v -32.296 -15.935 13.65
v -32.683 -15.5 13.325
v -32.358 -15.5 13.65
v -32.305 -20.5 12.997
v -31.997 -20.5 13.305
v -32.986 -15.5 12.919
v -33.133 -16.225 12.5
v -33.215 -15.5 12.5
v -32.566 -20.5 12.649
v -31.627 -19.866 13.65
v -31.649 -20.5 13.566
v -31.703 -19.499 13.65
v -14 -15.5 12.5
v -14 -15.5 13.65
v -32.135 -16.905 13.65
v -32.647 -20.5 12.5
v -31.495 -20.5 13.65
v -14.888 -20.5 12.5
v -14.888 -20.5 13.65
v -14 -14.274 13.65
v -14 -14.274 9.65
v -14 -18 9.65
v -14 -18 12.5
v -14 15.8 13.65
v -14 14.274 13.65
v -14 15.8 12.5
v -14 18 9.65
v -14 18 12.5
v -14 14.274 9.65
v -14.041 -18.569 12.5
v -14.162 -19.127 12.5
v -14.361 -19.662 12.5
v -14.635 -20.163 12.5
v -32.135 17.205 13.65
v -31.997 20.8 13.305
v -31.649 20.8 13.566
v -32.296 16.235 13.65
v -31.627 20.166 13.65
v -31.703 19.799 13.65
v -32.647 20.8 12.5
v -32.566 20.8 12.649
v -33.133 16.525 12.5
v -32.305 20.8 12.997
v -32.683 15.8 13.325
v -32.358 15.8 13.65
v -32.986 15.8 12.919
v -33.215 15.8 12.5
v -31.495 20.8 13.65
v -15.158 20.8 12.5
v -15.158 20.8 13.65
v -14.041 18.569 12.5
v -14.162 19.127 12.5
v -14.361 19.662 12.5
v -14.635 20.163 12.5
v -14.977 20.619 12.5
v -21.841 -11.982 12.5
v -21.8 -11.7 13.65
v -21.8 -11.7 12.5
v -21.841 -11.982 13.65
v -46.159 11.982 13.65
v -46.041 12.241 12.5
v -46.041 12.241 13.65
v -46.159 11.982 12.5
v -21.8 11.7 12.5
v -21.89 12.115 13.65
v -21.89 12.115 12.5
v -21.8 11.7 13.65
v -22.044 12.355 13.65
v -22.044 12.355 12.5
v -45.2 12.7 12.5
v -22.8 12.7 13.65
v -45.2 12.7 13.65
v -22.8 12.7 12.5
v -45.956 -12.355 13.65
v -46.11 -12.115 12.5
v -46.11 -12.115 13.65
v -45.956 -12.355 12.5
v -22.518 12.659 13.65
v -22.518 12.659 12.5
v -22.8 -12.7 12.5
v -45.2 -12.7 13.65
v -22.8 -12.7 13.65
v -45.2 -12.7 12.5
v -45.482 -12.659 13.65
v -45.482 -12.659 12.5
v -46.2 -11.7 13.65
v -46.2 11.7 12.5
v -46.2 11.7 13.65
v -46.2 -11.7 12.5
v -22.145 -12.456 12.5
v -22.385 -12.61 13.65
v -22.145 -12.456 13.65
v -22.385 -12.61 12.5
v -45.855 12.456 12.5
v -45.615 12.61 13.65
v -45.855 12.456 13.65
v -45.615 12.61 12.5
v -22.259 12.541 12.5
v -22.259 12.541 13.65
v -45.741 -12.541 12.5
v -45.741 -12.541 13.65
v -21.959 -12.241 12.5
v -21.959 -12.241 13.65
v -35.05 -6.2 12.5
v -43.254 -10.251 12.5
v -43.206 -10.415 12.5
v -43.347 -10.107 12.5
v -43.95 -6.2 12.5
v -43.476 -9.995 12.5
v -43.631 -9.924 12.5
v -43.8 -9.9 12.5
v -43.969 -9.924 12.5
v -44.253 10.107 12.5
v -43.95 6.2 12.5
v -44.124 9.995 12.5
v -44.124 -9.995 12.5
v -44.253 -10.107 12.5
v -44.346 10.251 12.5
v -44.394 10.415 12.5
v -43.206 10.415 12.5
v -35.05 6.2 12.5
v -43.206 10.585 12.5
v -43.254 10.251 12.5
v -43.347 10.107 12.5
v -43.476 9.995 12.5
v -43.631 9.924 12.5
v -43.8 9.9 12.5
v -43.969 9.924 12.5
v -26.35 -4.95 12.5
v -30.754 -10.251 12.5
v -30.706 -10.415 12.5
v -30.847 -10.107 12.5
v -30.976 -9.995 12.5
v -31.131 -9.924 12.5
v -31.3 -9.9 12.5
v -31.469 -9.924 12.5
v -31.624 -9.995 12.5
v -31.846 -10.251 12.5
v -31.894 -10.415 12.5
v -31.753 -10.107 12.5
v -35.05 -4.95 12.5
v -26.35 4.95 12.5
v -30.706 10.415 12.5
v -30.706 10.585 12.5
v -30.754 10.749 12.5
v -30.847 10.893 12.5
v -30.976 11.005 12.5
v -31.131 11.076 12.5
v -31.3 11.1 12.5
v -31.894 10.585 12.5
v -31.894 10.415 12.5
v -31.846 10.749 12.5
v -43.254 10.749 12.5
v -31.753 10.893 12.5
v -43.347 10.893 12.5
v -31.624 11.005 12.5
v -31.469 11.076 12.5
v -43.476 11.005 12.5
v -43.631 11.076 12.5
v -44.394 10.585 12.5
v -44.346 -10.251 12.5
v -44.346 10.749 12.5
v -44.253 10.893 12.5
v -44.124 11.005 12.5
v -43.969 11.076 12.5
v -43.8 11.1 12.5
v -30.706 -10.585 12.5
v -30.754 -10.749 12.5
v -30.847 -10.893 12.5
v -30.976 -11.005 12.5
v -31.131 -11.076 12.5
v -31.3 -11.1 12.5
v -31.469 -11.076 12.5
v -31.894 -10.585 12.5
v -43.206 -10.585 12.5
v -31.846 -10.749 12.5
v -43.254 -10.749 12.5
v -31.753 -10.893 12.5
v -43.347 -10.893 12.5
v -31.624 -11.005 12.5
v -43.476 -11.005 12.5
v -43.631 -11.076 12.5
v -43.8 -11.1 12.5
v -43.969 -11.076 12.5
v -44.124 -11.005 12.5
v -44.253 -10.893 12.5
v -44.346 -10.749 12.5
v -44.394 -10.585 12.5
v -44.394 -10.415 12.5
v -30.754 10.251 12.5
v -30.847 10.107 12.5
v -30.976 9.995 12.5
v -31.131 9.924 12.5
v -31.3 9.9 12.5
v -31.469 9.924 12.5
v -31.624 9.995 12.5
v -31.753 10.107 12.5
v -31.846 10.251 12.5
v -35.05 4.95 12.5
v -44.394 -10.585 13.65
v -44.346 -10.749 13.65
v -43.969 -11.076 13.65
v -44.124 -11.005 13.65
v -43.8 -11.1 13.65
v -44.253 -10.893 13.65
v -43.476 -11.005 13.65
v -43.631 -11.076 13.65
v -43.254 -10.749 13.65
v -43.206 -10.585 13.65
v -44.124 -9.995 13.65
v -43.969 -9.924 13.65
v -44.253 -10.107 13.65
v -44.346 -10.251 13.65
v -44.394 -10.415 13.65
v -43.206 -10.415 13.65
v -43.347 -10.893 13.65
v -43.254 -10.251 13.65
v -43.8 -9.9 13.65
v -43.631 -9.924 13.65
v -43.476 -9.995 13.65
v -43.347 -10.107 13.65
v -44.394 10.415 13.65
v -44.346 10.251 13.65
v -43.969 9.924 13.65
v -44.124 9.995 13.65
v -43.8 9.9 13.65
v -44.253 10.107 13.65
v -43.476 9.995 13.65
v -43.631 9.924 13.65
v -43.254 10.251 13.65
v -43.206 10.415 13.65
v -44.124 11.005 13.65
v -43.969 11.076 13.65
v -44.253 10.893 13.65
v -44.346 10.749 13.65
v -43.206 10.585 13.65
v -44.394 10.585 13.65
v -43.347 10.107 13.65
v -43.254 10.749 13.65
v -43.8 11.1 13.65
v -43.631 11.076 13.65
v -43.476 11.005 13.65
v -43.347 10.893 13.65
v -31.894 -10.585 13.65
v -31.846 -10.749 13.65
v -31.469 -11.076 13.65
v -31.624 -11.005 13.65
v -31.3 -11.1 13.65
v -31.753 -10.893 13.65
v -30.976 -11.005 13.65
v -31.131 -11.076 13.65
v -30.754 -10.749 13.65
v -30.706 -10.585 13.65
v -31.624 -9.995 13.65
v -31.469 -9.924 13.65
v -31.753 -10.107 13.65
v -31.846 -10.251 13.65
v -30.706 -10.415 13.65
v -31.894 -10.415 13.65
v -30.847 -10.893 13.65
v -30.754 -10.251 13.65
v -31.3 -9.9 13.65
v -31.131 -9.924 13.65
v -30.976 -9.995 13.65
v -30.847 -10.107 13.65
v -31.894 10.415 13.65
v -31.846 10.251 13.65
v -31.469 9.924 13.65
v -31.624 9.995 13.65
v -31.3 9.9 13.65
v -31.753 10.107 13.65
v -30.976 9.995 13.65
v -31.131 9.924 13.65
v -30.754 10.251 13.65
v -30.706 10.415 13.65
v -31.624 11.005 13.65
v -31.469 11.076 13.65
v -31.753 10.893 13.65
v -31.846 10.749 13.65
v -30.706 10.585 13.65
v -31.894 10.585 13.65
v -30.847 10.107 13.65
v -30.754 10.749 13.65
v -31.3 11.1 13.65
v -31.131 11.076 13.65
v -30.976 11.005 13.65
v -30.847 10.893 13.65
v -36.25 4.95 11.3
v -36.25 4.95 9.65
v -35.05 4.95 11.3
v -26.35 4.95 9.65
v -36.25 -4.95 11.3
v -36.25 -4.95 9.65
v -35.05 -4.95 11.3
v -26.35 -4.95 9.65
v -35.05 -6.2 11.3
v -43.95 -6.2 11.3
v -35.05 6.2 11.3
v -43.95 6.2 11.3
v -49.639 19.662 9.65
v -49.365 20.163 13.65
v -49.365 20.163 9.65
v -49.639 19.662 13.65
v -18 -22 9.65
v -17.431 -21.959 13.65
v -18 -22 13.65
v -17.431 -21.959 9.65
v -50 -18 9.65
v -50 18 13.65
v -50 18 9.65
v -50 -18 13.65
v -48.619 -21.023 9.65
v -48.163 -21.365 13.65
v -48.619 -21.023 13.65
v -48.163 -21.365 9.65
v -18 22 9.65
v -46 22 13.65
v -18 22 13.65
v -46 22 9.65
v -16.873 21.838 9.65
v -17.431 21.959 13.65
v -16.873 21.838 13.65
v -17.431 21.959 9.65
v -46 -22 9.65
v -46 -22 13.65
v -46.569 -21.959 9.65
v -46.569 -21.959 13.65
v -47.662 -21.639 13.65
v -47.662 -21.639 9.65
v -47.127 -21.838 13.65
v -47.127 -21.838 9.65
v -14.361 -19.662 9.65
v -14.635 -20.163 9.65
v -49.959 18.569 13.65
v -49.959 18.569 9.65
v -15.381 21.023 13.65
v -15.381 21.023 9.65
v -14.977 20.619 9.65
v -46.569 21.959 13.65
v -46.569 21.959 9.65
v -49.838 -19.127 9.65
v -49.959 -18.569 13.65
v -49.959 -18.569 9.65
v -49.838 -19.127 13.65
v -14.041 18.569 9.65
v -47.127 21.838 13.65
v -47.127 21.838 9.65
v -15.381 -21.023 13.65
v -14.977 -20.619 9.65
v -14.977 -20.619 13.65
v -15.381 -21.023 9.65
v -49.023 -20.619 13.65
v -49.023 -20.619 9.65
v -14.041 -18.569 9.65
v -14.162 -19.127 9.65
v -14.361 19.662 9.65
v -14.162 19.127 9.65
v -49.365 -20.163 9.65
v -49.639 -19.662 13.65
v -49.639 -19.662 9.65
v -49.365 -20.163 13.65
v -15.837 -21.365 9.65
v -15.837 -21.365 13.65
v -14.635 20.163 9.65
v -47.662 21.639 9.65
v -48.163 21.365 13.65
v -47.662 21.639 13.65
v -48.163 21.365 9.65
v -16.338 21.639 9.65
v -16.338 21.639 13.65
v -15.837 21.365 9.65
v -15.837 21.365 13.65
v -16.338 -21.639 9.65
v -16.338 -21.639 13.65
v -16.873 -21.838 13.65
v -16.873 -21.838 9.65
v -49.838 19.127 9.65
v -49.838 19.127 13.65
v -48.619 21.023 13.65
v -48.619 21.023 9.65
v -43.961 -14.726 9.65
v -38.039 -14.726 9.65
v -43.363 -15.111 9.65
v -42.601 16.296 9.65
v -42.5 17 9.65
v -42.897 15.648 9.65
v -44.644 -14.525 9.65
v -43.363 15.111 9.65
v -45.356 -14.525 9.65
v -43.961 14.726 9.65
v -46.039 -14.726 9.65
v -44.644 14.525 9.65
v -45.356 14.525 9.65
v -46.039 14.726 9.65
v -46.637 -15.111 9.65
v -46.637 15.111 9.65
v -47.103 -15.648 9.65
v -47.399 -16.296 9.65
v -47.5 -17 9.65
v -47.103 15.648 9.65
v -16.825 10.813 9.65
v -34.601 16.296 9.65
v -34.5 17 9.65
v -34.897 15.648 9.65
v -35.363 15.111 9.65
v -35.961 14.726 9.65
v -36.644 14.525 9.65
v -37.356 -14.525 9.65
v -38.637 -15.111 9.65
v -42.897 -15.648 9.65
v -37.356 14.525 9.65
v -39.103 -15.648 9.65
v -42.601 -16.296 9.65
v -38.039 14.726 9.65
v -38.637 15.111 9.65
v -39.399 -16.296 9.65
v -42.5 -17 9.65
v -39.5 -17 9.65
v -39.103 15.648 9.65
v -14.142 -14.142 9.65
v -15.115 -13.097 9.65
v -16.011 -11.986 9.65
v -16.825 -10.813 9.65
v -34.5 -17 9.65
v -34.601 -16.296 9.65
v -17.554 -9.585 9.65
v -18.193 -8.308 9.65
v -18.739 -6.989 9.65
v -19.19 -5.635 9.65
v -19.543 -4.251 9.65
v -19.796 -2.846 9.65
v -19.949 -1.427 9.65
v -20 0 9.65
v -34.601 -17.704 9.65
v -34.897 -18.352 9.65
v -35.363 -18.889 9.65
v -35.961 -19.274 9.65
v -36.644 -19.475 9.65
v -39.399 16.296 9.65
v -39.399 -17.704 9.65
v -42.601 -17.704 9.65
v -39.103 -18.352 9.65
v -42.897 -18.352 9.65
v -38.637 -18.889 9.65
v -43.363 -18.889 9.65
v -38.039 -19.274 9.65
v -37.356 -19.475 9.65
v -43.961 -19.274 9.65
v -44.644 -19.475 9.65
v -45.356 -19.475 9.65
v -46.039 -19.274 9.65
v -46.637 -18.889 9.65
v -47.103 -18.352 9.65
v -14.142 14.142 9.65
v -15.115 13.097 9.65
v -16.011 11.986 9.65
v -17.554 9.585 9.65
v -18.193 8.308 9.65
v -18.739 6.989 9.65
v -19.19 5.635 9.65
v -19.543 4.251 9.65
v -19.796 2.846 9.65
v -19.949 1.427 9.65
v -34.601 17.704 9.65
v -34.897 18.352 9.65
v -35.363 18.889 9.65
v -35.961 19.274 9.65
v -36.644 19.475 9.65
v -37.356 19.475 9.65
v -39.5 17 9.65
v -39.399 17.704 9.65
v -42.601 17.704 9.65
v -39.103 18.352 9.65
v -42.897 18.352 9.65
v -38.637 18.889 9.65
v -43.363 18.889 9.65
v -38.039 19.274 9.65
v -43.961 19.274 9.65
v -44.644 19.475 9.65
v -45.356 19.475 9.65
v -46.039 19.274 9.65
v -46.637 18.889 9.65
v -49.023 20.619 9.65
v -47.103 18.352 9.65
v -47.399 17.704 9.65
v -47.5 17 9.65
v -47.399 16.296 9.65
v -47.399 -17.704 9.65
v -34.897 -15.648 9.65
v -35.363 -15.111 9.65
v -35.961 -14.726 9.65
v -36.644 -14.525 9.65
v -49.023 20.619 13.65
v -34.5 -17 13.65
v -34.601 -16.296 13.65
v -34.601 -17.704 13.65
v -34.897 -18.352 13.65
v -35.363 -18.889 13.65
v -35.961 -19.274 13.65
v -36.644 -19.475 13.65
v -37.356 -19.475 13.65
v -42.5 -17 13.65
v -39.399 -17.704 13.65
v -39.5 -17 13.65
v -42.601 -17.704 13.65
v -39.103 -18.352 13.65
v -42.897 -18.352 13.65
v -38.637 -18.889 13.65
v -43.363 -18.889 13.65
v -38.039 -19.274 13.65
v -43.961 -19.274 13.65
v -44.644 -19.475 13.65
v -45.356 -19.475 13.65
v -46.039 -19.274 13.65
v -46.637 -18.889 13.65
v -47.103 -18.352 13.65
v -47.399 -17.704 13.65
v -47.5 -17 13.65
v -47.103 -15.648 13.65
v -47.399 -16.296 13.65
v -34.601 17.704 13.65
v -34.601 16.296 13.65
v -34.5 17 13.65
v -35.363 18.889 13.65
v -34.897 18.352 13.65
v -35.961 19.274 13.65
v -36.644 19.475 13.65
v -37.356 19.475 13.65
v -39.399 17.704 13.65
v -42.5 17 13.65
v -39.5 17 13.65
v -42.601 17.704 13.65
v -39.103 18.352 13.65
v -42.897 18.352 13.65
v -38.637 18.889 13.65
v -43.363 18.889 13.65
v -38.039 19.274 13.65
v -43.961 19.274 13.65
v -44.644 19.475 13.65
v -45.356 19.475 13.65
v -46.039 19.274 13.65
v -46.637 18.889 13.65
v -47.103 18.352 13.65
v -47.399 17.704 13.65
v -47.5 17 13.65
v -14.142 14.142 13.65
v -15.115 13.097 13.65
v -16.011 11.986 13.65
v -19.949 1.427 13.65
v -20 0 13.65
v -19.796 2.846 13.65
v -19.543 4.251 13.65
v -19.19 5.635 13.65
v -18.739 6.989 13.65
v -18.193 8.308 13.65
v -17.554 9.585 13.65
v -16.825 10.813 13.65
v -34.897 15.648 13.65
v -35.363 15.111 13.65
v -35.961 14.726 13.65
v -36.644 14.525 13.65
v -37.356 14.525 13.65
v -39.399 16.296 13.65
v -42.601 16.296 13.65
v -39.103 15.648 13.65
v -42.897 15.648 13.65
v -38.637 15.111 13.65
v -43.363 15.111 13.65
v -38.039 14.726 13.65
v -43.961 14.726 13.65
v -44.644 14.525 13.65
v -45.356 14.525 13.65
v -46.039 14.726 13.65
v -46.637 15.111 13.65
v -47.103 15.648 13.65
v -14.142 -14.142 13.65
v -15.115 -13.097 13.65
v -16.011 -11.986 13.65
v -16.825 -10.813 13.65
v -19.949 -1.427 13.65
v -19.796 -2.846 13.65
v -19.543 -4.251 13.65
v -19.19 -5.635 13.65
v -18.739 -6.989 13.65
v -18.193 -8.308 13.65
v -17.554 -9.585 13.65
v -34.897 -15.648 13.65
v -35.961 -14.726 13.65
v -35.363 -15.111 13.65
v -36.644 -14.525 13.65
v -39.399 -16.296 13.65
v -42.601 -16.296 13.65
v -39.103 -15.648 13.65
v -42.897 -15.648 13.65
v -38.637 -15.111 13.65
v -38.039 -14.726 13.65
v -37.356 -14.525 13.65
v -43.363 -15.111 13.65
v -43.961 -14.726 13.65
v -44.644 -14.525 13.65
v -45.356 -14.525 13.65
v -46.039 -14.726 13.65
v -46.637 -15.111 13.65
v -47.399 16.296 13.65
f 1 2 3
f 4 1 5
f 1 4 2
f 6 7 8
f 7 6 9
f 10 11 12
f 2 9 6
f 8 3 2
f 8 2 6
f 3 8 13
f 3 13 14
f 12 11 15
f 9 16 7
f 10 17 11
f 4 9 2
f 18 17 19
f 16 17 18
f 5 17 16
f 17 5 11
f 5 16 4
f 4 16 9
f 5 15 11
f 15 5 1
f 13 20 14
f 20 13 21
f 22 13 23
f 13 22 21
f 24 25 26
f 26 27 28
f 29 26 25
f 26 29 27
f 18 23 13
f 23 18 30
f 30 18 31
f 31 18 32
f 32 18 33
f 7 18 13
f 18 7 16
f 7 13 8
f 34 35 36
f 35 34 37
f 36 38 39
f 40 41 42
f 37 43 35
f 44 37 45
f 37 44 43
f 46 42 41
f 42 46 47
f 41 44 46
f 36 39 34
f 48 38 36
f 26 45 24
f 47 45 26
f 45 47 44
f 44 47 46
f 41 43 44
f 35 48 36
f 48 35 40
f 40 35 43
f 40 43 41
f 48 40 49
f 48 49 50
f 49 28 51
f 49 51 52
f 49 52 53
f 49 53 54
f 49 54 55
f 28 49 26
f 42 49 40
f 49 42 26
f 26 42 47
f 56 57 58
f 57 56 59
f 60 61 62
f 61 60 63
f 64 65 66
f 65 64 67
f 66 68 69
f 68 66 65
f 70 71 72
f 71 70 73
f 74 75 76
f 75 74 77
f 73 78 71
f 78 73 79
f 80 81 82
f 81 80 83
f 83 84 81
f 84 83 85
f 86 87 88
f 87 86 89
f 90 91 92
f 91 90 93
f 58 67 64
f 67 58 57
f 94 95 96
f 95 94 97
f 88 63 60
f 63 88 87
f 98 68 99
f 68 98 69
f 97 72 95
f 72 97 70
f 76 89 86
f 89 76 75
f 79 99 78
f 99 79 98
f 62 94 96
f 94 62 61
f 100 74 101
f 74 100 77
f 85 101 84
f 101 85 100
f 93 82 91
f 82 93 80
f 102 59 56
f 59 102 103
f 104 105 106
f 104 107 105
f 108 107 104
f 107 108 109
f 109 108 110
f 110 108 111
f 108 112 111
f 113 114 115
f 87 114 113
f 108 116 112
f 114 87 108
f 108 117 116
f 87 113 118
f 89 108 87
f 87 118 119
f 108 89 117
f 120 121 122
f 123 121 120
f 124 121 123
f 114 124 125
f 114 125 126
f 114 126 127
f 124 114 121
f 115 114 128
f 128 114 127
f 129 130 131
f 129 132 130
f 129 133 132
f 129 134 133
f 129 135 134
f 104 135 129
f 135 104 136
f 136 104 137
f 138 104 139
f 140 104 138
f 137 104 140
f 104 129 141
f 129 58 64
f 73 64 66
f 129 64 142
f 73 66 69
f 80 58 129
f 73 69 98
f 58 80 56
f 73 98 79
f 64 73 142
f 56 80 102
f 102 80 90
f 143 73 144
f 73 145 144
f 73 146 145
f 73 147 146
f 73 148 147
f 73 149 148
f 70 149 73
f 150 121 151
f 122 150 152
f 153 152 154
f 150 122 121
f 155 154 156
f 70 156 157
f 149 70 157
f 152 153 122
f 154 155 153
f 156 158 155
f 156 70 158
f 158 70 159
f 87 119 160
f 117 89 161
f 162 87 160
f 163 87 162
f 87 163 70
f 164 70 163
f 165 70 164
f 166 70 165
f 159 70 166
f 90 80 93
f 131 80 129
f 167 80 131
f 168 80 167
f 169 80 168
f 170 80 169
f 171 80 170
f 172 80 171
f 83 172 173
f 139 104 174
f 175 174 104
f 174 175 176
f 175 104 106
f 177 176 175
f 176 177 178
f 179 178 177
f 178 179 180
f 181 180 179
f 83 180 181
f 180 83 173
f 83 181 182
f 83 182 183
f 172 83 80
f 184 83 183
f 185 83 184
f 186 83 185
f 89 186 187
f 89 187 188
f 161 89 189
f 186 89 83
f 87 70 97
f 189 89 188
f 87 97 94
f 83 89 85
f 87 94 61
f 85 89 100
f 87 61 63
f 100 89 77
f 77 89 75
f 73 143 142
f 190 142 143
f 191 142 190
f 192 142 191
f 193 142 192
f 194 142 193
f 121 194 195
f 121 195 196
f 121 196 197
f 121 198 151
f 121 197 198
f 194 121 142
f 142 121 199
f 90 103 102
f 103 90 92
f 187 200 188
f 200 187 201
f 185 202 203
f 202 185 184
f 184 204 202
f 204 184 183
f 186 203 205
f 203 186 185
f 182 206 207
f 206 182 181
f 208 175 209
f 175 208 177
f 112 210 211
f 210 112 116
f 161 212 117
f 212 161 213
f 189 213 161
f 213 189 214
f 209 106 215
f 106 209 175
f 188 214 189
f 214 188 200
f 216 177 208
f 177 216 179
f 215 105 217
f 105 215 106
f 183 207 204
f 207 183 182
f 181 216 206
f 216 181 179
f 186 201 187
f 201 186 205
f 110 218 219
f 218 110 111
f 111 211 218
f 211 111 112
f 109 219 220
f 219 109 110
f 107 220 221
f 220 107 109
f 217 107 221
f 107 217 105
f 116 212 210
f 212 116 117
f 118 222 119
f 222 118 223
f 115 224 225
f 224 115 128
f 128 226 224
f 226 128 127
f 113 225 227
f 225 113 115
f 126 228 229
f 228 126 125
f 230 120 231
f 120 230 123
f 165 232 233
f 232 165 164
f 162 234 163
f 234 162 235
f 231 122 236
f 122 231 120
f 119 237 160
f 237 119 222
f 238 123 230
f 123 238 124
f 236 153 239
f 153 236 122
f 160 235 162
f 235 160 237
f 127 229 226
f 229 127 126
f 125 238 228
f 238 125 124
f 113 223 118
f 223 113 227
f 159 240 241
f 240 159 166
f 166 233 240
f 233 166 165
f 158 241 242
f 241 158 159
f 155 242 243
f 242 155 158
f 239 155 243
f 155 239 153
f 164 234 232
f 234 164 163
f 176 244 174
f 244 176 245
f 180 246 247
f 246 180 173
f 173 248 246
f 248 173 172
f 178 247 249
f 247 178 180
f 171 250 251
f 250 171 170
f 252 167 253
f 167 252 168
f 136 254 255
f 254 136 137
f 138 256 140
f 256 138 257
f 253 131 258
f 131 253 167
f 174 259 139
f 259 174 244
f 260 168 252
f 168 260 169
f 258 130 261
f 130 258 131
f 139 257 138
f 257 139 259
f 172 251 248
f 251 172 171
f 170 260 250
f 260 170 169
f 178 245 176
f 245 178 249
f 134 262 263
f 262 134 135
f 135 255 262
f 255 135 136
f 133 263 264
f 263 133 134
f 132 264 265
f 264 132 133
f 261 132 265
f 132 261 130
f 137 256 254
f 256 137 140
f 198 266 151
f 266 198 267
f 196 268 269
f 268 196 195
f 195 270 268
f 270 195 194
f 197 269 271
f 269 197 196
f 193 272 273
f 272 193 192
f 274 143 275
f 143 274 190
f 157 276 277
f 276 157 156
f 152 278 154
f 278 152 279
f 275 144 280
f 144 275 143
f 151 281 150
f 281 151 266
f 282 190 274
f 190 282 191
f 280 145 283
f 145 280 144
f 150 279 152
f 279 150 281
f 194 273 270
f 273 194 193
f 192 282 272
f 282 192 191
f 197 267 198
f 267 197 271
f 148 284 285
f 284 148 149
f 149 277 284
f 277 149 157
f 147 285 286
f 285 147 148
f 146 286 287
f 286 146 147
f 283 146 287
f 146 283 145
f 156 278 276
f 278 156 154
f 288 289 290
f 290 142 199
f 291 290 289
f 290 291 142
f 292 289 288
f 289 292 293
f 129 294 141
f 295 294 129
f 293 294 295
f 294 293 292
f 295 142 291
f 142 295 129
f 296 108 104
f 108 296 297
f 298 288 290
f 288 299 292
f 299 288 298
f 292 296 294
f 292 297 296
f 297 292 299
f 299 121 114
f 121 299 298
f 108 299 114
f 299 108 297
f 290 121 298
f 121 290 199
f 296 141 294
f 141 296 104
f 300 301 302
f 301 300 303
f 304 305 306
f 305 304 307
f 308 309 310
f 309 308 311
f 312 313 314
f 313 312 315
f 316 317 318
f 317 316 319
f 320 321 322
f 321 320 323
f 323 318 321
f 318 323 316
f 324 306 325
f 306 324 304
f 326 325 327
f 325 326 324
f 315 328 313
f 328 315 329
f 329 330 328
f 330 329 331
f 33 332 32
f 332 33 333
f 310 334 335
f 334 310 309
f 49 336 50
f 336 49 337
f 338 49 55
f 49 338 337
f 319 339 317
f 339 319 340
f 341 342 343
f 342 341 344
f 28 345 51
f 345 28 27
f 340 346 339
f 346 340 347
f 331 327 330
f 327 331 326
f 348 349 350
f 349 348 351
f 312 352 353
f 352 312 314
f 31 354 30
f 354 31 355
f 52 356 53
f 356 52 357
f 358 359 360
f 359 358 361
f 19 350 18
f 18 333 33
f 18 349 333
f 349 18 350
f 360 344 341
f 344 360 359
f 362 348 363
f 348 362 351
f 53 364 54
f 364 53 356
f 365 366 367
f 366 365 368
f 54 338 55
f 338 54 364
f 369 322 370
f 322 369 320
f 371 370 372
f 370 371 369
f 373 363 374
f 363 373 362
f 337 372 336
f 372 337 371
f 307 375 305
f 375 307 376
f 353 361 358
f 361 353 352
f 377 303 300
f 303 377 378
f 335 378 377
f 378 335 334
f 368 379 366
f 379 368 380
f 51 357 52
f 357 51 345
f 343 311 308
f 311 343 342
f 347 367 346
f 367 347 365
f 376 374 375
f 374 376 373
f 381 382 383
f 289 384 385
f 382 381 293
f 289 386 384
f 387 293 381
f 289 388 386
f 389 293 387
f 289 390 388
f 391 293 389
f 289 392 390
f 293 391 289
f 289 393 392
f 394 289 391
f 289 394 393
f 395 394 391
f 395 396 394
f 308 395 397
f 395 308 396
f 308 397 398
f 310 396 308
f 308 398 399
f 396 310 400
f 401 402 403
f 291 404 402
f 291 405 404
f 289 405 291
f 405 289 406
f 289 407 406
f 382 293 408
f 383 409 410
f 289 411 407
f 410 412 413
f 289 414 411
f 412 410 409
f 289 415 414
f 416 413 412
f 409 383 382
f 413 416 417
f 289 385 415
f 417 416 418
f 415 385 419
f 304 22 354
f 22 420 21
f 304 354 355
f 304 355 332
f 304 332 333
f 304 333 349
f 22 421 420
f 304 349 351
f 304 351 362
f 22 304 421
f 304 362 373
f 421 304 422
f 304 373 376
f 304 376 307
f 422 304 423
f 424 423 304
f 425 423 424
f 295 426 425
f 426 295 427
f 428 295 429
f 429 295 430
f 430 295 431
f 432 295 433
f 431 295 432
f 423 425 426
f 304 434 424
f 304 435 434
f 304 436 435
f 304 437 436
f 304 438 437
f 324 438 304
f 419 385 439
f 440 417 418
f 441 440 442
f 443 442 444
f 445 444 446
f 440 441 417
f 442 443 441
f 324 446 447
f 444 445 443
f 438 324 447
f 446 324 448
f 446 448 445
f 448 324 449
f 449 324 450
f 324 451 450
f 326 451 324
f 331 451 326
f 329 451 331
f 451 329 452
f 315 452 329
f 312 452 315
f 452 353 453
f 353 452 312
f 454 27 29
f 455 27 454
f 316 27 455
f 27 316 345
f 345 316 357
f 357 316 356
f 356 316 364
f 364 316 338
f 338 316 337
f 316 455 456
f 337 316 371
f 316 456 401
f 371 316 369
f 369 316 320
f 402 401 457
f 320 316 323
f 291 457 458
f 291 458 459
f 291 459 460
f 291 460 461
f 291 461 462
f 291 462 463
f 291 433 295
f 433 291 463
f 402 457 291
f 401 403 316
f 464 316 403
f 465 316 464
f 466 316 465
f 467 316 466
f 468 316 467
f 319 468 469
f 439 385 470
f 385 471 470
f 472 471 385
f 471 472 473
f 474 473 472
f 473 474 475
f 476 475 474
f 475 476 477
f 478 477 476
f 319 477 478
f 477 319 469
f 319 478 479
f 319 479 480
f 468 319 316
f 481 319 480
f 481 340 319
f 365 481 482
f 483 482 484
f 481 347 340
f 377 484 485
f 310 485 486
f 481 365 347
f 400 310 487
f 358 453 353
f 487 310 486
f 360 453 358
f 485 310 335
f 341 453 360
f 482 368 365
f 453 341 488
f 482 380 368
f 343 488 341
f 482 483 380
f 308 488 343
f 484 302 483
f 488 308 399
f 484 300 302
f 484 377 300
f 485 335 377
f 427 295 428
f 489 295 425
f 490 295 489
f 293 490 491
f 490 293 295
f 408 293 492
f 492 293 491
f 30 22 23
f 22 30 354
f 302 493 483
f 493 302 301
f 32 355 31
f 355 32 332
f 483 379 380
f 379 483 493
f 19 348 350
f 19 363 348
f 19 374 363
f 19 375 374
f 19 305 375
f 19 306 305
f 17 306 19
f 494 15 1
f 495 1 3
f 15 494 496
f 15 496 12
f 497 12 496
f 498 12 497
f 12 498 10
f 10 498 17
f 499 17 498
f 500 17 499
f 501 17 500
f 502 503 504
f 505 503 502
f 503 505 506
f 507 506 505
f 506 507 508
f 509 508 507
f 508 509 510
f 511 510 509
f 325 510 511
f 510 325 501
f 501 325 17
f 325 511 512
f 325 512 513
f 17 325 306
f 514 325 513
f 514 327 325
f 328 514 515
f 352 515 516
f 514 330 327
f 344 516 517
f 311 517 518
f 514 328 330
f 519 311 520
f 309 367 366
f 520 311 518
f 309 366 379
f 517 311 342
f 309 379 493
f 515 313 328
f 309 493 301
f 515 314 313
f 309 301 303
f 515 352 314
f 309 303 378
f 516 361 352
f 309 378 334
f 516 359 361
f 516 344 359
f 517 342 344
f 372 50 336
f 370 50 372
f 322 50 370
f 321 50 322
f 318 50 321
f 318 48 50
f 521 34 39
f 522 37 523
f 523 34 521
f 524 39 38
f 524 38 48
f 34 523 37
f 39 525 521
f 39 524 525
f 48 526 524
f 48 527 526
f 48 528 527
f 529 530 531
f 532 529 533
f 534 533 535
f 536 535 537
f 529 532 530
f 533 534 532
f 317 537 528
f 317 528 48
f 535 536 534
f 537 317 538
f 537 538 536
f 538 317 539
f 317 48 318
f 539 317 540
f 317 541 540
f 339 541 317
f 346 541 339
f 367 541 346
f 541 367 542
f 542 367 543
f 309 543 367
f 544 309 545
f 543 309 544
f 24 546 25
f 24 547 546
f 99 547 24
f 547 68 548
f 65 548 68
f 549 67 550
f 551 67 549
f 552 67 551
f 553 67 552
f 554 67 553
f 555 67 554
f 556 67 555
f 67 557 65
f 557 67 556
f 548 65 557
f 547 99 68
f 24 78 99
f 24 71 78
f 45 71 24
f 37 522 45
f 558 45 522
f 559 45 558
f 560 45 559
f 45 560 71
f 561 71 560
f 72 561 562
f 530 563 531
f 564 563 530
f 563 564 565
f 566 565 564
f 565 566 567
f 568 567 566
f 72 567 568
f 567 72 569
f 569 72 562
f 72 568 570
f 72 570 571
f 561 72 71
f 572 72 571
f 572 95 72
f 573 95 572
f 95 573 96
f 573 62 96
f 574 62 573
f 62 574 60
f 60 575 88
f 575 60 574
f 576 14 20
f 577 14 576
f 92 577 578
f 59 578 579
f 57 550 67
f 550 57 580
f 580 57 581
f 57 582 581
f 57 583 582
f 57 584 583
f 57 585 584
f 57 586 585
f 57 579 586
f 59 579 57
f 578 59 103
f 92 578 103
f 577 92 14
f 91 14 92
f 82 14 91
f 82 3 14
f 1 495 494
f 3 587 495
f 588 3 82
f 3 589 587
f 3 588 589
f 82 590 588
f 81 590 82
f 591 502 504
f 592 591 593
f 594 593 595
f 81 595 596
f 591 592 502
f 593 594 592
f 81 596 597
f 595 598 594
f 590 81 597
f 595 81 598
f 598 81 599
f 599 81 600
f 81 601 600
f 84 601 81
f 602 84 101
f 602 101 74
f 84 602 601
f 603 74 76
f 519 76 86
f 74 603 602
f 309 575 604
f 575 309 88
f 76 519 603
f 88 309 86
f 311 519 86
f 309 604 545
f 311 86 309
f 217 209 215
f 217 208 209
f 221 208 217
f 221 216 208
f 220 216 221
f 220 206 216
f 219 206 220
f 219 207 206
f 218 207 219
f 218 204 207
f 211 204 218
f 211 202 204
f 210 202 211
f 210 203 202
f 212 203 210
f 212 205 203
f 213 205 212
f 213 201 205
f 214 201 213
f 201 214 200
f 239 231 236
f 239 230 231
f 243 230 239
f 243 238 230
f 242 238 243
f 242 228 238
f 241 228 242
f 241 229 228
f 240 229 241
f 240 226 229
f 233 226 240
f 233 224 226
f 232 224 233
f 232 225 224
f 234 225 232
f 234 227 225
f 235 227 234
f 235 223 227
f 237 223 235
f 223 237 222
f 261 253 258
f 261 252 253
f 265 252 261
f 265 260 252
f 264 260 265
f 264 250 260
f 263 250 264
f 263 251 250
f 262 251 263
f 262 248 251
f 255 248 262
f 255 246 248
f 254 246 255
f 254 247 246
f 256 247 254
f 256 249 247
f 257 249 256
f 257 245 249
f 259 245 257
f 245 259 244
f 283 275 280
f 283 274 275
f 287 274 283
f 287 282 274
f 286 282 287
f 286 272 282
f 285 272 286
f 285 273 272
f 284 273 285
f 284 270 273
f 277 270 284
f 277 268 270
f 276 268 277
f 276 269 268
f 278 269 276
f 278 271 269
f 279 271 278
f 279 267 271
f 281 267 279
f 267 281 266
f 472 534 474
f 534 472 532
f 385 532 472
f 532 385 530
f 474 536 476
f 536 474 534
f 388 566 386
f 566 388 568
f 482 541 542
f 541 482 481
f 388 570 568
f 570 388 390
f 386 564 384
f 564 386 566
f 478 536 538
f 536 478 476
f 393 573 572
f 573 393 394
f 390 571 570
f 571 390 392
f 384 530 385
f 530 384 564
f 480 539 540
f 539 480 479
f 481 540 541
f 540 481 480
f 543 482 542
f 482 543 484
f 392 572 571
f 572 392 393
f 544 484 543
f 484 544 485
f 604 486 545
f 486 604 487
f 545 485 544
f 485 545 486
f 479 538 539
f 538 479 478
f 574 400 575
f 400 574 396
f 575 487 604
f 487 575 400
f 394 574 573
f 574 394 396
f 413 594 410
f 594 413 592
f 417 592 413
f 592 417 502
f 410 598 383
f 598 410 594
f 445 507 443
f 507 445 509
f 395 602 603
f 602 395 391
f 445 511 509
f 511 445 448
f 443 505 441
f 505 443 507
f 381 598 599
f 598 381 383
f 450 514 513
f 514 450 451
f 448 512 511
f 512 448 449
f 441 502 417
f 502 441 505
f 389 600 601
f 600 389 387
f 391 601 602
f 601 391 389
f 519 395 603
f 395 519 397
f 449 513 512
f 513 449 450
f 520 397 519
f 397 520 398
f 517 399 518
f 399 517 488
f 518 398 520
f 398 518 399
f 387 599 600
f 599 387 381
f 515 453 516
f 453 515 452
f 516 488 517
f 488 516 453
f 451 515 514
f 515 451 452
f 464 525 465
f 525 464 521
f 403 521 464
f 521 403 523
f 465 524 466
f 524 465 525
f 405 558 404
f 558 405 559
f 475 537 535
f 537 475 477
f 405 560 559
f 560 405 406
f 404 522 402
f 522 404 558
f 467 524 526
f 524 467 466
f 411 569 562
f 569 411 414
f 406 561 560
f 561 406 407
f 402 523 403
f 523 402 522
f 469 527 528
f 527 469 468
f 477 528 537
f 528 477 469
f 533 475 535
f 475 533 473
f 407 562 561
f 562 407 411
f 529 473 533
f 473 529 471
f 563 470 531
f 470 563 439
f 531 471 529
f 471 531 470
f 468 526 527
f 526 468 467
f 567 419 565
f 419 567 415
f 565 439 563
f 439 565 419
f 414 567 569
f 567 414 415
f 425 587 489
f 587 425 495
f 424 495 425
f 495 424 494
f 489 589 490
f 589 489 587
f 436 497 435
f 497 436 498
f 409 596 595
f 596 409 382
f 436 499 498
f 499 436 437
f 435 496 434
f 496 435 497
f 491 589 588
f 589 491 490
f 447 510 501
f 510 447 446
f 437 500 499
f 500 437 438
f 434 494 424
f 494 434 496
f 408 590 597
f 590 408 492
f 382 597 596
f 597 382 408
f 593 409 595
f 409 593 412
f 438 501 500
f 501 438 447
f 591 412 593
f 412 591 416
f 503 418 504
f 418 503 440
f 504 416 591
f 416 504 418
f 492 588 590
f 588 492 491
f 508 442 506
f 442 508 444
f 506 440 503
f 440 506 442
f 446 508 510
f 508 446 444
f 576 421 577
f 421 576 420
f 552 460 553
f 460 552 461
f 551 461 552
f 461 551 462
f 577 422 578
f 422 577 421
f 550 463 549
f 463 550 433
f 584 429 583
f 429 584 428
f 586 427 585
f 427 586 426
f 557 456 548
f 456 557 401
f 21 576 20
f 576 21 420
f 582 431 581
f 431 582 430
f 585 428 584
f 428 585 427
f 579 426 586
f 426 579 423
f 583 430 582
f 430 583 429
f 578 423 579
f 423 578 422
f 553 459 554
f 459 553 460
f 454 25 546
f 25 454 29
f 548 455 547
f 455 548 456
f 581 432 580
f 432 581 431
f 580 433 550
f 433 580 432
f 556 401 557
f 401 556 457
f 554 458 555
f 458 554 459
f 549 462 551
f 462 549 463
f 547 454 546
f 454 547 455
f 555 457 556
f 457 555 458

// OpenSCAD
// file: cam1.scad
// cam1
// models for the picamera v2.1

//----------------------------
module cam1(){
difference(){
    linear_extrude(height=1.1)
    offset(r=1,$fn=22)
    square([23,22],center=true);

    translate([10.5,9.8,0])
    cylinder(r=1,h=3,$fn=22);

    translate([-10.5,9.8,0])
    cylinder(r=1,h=3,$fn=22);

    translate([10.5,9.8-12.5,0])
    cylinder(r=1,h=3,$fn=22);

    translate([-10.5,9.8-12.5,0])
    cylinder(r=1,h=3,$fn=22);
}

// lens and box
translate([0,-2.7,0]){
    linear_extrude(height=5)
    square([9.5,9.5],center=true);
    cylinder(r=7.25/2,h=6.75,$fn=22);
    cylinder(r=6/2,h=6.75+0.6,$fn=22);
}

// cable off lens box
color("red")
translate([0,5.5,1.25])
cube([12,8.5,2.5],center=true);

// main cable
color("green")
translate([0,-12+3.5,-1.5])
cube([21,7,3],center=true);

// ribbon if needed
color("orange")
translate([0,-14,-1])
linear_extrude(height=0.4)
square([16.4,10],center=true);

// component clearance on backside
color("red")
translate([0,0,-1.5])
difference(){
    linear_extrude(height=1.5)
    offset(r=1,$fn=22)
    square([23-0.5,22-0.5],center=true);

    translate([10.5,9.8,0])
    cylinder(r=2.5,h=1.5,$fn=22);

    translate([-10.5,9.8,0])
    cylinder(r=2.5,h=1.5,$fn=22);

    translate([10.5,9.8-12.5,0])
    cylinder(r=2.5,h=1.5,$fn=22);

    translate([-10.5,9.8-12.5,0])
    cylinder(r=2.5,h=1.5,$fn=22);
}
} //---------- end module cam1 ----------

module cam1cut(tol=0.1){
difference(){
    linear_extrude(height=1.1+tol)
    offset(r=1,$fn=22)
    square([23+tol,22+tol],center=true);

    translate([10.5,9.8,0])
    cylinder(r=1-tol,h=3,$fn=22);

    translate([-10.5,9.8,0])
    cylinder(r=1-tol,h=3,$fn=22);

    translate([10.5,9.8-12.5,0])
    cylinder(r=1-tol,h=3,$fn=22);

    translate([-10.5,9.8-12.5,0])
    cylinder(r=1-tol,h=3,$fn=22);
}

// lens and box
translate([0,-2.7,0]){
    linear_extrude(height=5+tol)
    square([9.5+tol,9.5+tol],center=true);
    cylinder(r=7.25/2+tol/2,h=6.75+tol,$fn=22);
    cylinder(r=6/2+tol/2,h=6.75+0.6+tol,$fn=22);
}

// cable off lens box
translate([0,5.5,1.25])
cube([12+tol,8.5+tol,2.5+tol],center=true);

// main cable
color("green")
translate([0,-12+3.5,-1.5])
cube([21+tol,7+tol,3+tol],center=true);

// ribbon if needed
color("orange")
translate([0,-14,-1])
linear_extrude(height=0.4+tol)
square([16.4+tol,10+tol],center=true);

// component clearance on backside
color("red")
translate([0,0,-1.5-tol])
difference(){
    linear_extrude(height=1.5+tol)
    offset(r=1,$fn=22)
    square([23-0.5+tol,22-0.5+tol],center=true);

    translate([10.5,9.8,0])
    cylinder(r=2.5,h=1.5+tol,$fn=22);

    translate([-10.5,9.8,0])
    cylinder(r=2.5,h=1.5+tol,$fn=22);

    translate([10.5,9.8-12.5,0])
    cylinder(r=2.5,h=1.5+tol,$fn=22);

    translate([-10.5,9.8-12.5,0])
    cylinder(r=2.5,h=1.5+tol,$fn=22);
}
} //---------- end module cam1cut ----------

/*
difference(){
    cam1cut();
cam1();
}
*/
cam1();

//translate([35,0,0])
//cam1cut();
// file: arm1.scad
// armSingle for sg92r micro servo

//------------------------------------------
// arm1
module arm1(){
difference(){
    union(){
        // Boss
        cylinder(r=3.55,h=4.75,$fn=44);
        // arm
        hull(){
            translate([0,0,4.75-1.85])
            cylinder(r=3.2,h=1.85,$fn=22);

            translate([14,0,4.75-1.85])
            cylinder(r=3.9/2,h=1.85,$fn=22);
        }
    }

    // bottom cut
    cylinder(r=2.2,h=3.0,$fn=22);
    // thru cut
    cylinder(r=1.1,h=5,$fn=22);
    // top cut
    translate([0,0,4.75-1.0])
    cylinder(r=2.32,h=1,$fn=44);
    
    // holes in the arm
    for(i=[0:5])
    translate([4.7+i*9.75/5,0,4.75-1.85])
    cylinder(r=0.4,h=2,$fn=22);
}
} // ---------- end module arm1 -------

// arm1cut
module arm1cut(tol=0.1){
difference(){
    union(){
        // Boss
        cylinder(r=3.55+tol/2,h=4.75+tol,$fn=44);
        // arm
        hull(){
            translate([0,0,4.75-1.85])
            cylinder(r=3.2+tol/2,h=1.85+tol,$fn=22);

            translate([14,0,4.75-1.85])
            cylinder(r=3.9/2+tol,h=1.85,$fn=22);
        }
    }

    // bottom cut if needed
//    cylinder(r=2.2-tol/2,h=3.0-tol,$fn=22);
}
} // ---------- end module arm1cut -------

difference(){
arm1cut();
arm1();
}

translate([0,15,0])
arm1cut();
// file: servo1.scad
// Pan Tilt PiCamera for the Bots project

//-------------------------------------
module servo1 (){
// Servo body
hull(){
  linear_extrude(height=0.01)
  square([23,12.65],center=true);

  translate([0,0,22.9])
  linear_extrude(height=0.01)
  square([22.4,11.9],center=true);
}
// Tabs
difference(){
    translate([0,0,16])
    linear_extrude(height=2.5)
    square([32.45,12.0],center=true);
     
    translate([14,0,16])
    cylinder(h=3,r=1.25,$fn=22);
    translate([-14,0,16])
    cylinder(h=3,r=1.25,$fn=22);
}
// Collar
translate([5.25,0,22.8])
cylinder(h=4.5,r=6,$fn=40);
hull(){
    translate([-1.6,0,22.8])
    cylinder(h=4.5,r=2.5,$fn=40);
    translate([2,0,22.8])
    cylinder(h=4.5,r=2.5,$fn=40);
}
// Shaft
color("red")
translate([5.25,0,0])
cylinder(h=30.3,r=2.3,$fn=40);

// Wires
color("red")
translate([10,1.3,4.8])
rotate([0,90,0])
cylinder(h=6,r=1.3/2,$fn=22);
color("orange")
translate([10,0,4.8])
rotate([0,90,0])
cylinder(h=6,r=1.3/2,$fn=22);
color("brown")
translate([6,-1.3,4.8])
rotate([0,90,0])
cylinder(h=10,r=1.3/2,$fn=22);

} // --------- end module servo1 -------

module servo1cut (tol=0.1){
// Servo body
hull(){
  linear_extrude(height=0.01)
  square([23+tol,12.65+tol],center=true);

  translate([0,0,22.9+tol])
  linear_extrude(height=0.01)
  square([22.4+tol,11.9+tol],center=true);
}
// Tabs
difference(){
    translate([0,0,16-tol])
    linear_extrude(height=2.5+2*tol)
    square([32.45+tol,12.0+tol],center=true);
}

// Collar
translate([5.25,0,22.8+tol])
cylinder(h=4.5+tol,r=6+tol/2,$fn=40);
hull(){
    translate([-1.6,0,22.8])
    cylinder(h=4.5+tol/2,r=2.5+tol/2,$fn=40);
    translate([2,0,22.8])
    cylinder(h=4.5+tol/2,r=2.5+tol/2,$fn=40);
}
// Shaft
color("red")
translate([5.25,0,0])
cylinder(h=30.3+tol,r=2.3+tol/2,$fn=40);

// Wires
hull(){
    color("red")
    translate([10,1.3,4.8])
    rotate([0,90,0])
    cylinder(h=6,r=1.3/2+tol,$fn=22);
    color("brown")
    translate([6,-1.3,4.8])
    rotate([0,90,0])
    cylinder(h=10,r=1.3/2+tol,$fn=22);
}
} // --------- end module servo1cut -------

difference(){
servo1cut();
servo1();
}

//translate([0,30,0])
//servo1cut();
// file: top1.scad
// TopBase part
use <arm1.scad>
use <servo1.scad>

//----------------------------
module top1(){
difference(){
    // boss
    color("cyan")
    linear_extrude(height=16.8,scale=0.9)
    circle(20,$fn=200);

    // arm embedded in the base
    rotate([0,0,180])
    arm1cut();

    // servo stacked on top of arm
    translate([0,12,11-0.1])
    rotate([90,0,0])
    servo1cut(tol=0.3);
    
    // cut on active side
    color("yellow")
    translate([-30,-25,3])
    linear_extrude(height=16)
    square([60,10]);

    // cut on active side
    color("pink")
    translate([-30,15,3])
    linear_extrude(height=16)
    square([60,10]);
    
    // cuts to drop in the servo
    color("blue")
    translate([-4.1,-21,10])
    linear_extrude(height=16)
    square([15.5,10]);
    
    // cut to drop in the servo wires
    color("green")
    translate([5,5.5,8])
    linear_extrude(height=16)
    square([16,3]);

    // clearance for the embedded arm
    color("pink")
    translate([-13,0,4])
    linear_extrude(height=8,scale=0.5)
    circle(3.5);
/*
    // underside circular cutout
    // can't print flat if used here
    // put a ridge on the topside of the base
    // instead.
    difference(){
        translate([0,0,-0.1])
        linear_extrude(height=1.5,scale=0.9)
        circle(18);
        
        translate([0,0,-0.1])
        linear_extrude(height=1.5,scale=1.1)
        circle(5.5);
    }
 */   
}
  
/*
// base indicator - remove before print
linear_extrude(height=0.1)
square([80,40],center=true);
*/

// The peg
color("orange")
translate([5.3,15,11])
rotate([-90,0,0])
cylinder(h=4,r1=3.5,r2=2.5,$fn=100);

color("yellow")
translate([5.3,15,11])
rotate([-90,0,0])
cylinder(h=0.4,r1=5.8,r2=5.6,$fn=40);

color("green")
translate([5.3,19,11])
rotate([-90,0,0])
cylinder(h=0.5,r1=2.5,r2=2.0,$fn=40);


} // ------- end module top1 ------------


top1();

/*
// where parts should fit:
// base arm
rotate([0,0,180])
arm1();

// servo
translate([0,12,11-0.1])
rotate([90,0,0])
servo1();
*/
// main file
// bracket2
// second try at the camera bracket

use <top1.scad>
use <servo1.scad>
use <arm1.scad>
use <cam1.scad>

//--------------------------
module active1(tol=0.1){    
// active side
color("red")
difference(){
    hull(){
        translate([5,-15.5,11])
        rotate([90,0,0])
        cylinder(h=4.7,r1=7.5,r2=7.0,$fn=44);

        translate([-30,-15.5,11])
        rotate([90,0,0])
        cylinder(h=4.7,r1=3.5,r2=3.0,$fn=44);
    }

    // arm
    translate([5,-15.5,11])
    rotate([90,180,0])
    arm1cut();

    // dovetail
    color("pink")
    translate([-34,-21,11-3/2])
    cube([20,6,3]);

}

} //------------
module active1cut(tol=0.1){    
// active side
color("red")
difference(){
    hull(){
        translate([5,-15.5,11])
        rotate([90,0,0])
        cylinder(h=4.7+tol*3,r1=7.5+tol/2,r2=7.0+tol/2,$fn=44);

        translate([-30,-15.5,11])
        rotate([90,0,0])
        cylinder(h=4.7+tol*3,r1=3.5+tol/2,r2=3.0+tol/2,$fn=44);
    }

    // dovetail
    color("pink")
    translate([-34,-21,11-3/2+tol])
    cube([20,6+tol,3-tol]);

}

} //------------

module passive1(tol=0.1){
// passive side
color("cyan")
difference(){
    hull(){
        translate([5,15.5,11])
        rotate([-90,0,0])
        cylinder(h=4.7+tol*3,r1=7.5,r2=7.0,$fn=44);

        translate([-30,15.5,11])
        rotate([-90,0,0])
        cylinder(h=4.7+tol*3,r1=3.5,r2=3.0,$fn=44);
    }

    // peg+tol from top1

    color("orange")
    translate([5.3,15,11])
    rotate([-90,0,0])
    cylinder(h=6+tol,r1=3.5+tol/2,r2=2.5+tol/2,$fn=100);

    color("yellow")
    translate([5.3,15,11])
    rotate([-90,0,0])
    cylinder(h=0.4,r1=5.8,r2=5.6,$fn=40);

    color("green")
    translate([5.3,19,11])
    rotate([-90,0,0])
    cylinder(h=0.5+tol,r1=2.6+tol,r2=2.0+tol,$fn=100);

    // dovetails
    color("orange")
    translate([-34,15,11-3/2])
    cube([20,6,3]);

}

} //-------------------

module passive1cut(tol=0.1){
// passive side
color("green")
difference(){
    hull(){
        translate([5,15.5+tol*3,11])
        rotate([-90,0,0])
        cylinder(h=4.7+tol*3,r1=7.5+tol/2,r2=7.0+tol/2,$fn=44);

        translate([-30,15.5+tol*3,11])
        rotate([-90,0,0])
        cylinder(h=4.7+tol*3,r1=3.5+tol/2,r2=3.0+tol/2,$fn=44);
    }

    // dovetails
    color("orange")
    translate([-34,15,11-3/2+tol])
    cube([20,6+tol,3-tol]);

}

} //-------------------

/*
// dovetails
color("orange")
translate([-34,15,11-3/2])
cube([20,6,3]);


color("pink")
translate([-34,-21,11-3/2])
cube([20,6,3]);
*/

module plate1(tol=0.1){


difference(){
    // plate
    color("yellow")
    translate([-46,-18,11-4/2+0.65])
    linear_extrude(height=4)
    offset(r=4,$fn=44)
    square([28,36]);

    active1cut();
    passive1cut();
    
    // circular cuts
    translate([-45,17,8])
    cylinder(h=10,r=2.5,$fn=22);
    translate([-45,-17,8])
    cylinder(h=10,r=2.5,$fn=22);

    translate([-37,17,8])
    cylinder(h=10,r=2.5,$fn=22);
    translate([-37,-17,8])
    cylinder(h=10,r=2.5,$fn=22);
    
    // clearance for the top
    translate([0,0,0])
    cylinder(h=20,r=20,$fn=88);
    
    // cut for the camera
    translate([-34,0,14.0])
    rotate([0,180,90])
    cam1cut(tol=0.4);
}
} //---- end module plate1 ----


plate1();

/*
    // camera
    translate([-34,0,14])
    rotate([0,180,90])
    cam1();
*/

/*
difference(){
    active1cut();
    active1();
}    
difference(){
    passive1cut();
    passive1();
}    
*/

//active1();
//passive1();


// top 
//top1();

// servo
//translate([0,12,11-0.1])
//rotate([90,0,0])
//servo1();
